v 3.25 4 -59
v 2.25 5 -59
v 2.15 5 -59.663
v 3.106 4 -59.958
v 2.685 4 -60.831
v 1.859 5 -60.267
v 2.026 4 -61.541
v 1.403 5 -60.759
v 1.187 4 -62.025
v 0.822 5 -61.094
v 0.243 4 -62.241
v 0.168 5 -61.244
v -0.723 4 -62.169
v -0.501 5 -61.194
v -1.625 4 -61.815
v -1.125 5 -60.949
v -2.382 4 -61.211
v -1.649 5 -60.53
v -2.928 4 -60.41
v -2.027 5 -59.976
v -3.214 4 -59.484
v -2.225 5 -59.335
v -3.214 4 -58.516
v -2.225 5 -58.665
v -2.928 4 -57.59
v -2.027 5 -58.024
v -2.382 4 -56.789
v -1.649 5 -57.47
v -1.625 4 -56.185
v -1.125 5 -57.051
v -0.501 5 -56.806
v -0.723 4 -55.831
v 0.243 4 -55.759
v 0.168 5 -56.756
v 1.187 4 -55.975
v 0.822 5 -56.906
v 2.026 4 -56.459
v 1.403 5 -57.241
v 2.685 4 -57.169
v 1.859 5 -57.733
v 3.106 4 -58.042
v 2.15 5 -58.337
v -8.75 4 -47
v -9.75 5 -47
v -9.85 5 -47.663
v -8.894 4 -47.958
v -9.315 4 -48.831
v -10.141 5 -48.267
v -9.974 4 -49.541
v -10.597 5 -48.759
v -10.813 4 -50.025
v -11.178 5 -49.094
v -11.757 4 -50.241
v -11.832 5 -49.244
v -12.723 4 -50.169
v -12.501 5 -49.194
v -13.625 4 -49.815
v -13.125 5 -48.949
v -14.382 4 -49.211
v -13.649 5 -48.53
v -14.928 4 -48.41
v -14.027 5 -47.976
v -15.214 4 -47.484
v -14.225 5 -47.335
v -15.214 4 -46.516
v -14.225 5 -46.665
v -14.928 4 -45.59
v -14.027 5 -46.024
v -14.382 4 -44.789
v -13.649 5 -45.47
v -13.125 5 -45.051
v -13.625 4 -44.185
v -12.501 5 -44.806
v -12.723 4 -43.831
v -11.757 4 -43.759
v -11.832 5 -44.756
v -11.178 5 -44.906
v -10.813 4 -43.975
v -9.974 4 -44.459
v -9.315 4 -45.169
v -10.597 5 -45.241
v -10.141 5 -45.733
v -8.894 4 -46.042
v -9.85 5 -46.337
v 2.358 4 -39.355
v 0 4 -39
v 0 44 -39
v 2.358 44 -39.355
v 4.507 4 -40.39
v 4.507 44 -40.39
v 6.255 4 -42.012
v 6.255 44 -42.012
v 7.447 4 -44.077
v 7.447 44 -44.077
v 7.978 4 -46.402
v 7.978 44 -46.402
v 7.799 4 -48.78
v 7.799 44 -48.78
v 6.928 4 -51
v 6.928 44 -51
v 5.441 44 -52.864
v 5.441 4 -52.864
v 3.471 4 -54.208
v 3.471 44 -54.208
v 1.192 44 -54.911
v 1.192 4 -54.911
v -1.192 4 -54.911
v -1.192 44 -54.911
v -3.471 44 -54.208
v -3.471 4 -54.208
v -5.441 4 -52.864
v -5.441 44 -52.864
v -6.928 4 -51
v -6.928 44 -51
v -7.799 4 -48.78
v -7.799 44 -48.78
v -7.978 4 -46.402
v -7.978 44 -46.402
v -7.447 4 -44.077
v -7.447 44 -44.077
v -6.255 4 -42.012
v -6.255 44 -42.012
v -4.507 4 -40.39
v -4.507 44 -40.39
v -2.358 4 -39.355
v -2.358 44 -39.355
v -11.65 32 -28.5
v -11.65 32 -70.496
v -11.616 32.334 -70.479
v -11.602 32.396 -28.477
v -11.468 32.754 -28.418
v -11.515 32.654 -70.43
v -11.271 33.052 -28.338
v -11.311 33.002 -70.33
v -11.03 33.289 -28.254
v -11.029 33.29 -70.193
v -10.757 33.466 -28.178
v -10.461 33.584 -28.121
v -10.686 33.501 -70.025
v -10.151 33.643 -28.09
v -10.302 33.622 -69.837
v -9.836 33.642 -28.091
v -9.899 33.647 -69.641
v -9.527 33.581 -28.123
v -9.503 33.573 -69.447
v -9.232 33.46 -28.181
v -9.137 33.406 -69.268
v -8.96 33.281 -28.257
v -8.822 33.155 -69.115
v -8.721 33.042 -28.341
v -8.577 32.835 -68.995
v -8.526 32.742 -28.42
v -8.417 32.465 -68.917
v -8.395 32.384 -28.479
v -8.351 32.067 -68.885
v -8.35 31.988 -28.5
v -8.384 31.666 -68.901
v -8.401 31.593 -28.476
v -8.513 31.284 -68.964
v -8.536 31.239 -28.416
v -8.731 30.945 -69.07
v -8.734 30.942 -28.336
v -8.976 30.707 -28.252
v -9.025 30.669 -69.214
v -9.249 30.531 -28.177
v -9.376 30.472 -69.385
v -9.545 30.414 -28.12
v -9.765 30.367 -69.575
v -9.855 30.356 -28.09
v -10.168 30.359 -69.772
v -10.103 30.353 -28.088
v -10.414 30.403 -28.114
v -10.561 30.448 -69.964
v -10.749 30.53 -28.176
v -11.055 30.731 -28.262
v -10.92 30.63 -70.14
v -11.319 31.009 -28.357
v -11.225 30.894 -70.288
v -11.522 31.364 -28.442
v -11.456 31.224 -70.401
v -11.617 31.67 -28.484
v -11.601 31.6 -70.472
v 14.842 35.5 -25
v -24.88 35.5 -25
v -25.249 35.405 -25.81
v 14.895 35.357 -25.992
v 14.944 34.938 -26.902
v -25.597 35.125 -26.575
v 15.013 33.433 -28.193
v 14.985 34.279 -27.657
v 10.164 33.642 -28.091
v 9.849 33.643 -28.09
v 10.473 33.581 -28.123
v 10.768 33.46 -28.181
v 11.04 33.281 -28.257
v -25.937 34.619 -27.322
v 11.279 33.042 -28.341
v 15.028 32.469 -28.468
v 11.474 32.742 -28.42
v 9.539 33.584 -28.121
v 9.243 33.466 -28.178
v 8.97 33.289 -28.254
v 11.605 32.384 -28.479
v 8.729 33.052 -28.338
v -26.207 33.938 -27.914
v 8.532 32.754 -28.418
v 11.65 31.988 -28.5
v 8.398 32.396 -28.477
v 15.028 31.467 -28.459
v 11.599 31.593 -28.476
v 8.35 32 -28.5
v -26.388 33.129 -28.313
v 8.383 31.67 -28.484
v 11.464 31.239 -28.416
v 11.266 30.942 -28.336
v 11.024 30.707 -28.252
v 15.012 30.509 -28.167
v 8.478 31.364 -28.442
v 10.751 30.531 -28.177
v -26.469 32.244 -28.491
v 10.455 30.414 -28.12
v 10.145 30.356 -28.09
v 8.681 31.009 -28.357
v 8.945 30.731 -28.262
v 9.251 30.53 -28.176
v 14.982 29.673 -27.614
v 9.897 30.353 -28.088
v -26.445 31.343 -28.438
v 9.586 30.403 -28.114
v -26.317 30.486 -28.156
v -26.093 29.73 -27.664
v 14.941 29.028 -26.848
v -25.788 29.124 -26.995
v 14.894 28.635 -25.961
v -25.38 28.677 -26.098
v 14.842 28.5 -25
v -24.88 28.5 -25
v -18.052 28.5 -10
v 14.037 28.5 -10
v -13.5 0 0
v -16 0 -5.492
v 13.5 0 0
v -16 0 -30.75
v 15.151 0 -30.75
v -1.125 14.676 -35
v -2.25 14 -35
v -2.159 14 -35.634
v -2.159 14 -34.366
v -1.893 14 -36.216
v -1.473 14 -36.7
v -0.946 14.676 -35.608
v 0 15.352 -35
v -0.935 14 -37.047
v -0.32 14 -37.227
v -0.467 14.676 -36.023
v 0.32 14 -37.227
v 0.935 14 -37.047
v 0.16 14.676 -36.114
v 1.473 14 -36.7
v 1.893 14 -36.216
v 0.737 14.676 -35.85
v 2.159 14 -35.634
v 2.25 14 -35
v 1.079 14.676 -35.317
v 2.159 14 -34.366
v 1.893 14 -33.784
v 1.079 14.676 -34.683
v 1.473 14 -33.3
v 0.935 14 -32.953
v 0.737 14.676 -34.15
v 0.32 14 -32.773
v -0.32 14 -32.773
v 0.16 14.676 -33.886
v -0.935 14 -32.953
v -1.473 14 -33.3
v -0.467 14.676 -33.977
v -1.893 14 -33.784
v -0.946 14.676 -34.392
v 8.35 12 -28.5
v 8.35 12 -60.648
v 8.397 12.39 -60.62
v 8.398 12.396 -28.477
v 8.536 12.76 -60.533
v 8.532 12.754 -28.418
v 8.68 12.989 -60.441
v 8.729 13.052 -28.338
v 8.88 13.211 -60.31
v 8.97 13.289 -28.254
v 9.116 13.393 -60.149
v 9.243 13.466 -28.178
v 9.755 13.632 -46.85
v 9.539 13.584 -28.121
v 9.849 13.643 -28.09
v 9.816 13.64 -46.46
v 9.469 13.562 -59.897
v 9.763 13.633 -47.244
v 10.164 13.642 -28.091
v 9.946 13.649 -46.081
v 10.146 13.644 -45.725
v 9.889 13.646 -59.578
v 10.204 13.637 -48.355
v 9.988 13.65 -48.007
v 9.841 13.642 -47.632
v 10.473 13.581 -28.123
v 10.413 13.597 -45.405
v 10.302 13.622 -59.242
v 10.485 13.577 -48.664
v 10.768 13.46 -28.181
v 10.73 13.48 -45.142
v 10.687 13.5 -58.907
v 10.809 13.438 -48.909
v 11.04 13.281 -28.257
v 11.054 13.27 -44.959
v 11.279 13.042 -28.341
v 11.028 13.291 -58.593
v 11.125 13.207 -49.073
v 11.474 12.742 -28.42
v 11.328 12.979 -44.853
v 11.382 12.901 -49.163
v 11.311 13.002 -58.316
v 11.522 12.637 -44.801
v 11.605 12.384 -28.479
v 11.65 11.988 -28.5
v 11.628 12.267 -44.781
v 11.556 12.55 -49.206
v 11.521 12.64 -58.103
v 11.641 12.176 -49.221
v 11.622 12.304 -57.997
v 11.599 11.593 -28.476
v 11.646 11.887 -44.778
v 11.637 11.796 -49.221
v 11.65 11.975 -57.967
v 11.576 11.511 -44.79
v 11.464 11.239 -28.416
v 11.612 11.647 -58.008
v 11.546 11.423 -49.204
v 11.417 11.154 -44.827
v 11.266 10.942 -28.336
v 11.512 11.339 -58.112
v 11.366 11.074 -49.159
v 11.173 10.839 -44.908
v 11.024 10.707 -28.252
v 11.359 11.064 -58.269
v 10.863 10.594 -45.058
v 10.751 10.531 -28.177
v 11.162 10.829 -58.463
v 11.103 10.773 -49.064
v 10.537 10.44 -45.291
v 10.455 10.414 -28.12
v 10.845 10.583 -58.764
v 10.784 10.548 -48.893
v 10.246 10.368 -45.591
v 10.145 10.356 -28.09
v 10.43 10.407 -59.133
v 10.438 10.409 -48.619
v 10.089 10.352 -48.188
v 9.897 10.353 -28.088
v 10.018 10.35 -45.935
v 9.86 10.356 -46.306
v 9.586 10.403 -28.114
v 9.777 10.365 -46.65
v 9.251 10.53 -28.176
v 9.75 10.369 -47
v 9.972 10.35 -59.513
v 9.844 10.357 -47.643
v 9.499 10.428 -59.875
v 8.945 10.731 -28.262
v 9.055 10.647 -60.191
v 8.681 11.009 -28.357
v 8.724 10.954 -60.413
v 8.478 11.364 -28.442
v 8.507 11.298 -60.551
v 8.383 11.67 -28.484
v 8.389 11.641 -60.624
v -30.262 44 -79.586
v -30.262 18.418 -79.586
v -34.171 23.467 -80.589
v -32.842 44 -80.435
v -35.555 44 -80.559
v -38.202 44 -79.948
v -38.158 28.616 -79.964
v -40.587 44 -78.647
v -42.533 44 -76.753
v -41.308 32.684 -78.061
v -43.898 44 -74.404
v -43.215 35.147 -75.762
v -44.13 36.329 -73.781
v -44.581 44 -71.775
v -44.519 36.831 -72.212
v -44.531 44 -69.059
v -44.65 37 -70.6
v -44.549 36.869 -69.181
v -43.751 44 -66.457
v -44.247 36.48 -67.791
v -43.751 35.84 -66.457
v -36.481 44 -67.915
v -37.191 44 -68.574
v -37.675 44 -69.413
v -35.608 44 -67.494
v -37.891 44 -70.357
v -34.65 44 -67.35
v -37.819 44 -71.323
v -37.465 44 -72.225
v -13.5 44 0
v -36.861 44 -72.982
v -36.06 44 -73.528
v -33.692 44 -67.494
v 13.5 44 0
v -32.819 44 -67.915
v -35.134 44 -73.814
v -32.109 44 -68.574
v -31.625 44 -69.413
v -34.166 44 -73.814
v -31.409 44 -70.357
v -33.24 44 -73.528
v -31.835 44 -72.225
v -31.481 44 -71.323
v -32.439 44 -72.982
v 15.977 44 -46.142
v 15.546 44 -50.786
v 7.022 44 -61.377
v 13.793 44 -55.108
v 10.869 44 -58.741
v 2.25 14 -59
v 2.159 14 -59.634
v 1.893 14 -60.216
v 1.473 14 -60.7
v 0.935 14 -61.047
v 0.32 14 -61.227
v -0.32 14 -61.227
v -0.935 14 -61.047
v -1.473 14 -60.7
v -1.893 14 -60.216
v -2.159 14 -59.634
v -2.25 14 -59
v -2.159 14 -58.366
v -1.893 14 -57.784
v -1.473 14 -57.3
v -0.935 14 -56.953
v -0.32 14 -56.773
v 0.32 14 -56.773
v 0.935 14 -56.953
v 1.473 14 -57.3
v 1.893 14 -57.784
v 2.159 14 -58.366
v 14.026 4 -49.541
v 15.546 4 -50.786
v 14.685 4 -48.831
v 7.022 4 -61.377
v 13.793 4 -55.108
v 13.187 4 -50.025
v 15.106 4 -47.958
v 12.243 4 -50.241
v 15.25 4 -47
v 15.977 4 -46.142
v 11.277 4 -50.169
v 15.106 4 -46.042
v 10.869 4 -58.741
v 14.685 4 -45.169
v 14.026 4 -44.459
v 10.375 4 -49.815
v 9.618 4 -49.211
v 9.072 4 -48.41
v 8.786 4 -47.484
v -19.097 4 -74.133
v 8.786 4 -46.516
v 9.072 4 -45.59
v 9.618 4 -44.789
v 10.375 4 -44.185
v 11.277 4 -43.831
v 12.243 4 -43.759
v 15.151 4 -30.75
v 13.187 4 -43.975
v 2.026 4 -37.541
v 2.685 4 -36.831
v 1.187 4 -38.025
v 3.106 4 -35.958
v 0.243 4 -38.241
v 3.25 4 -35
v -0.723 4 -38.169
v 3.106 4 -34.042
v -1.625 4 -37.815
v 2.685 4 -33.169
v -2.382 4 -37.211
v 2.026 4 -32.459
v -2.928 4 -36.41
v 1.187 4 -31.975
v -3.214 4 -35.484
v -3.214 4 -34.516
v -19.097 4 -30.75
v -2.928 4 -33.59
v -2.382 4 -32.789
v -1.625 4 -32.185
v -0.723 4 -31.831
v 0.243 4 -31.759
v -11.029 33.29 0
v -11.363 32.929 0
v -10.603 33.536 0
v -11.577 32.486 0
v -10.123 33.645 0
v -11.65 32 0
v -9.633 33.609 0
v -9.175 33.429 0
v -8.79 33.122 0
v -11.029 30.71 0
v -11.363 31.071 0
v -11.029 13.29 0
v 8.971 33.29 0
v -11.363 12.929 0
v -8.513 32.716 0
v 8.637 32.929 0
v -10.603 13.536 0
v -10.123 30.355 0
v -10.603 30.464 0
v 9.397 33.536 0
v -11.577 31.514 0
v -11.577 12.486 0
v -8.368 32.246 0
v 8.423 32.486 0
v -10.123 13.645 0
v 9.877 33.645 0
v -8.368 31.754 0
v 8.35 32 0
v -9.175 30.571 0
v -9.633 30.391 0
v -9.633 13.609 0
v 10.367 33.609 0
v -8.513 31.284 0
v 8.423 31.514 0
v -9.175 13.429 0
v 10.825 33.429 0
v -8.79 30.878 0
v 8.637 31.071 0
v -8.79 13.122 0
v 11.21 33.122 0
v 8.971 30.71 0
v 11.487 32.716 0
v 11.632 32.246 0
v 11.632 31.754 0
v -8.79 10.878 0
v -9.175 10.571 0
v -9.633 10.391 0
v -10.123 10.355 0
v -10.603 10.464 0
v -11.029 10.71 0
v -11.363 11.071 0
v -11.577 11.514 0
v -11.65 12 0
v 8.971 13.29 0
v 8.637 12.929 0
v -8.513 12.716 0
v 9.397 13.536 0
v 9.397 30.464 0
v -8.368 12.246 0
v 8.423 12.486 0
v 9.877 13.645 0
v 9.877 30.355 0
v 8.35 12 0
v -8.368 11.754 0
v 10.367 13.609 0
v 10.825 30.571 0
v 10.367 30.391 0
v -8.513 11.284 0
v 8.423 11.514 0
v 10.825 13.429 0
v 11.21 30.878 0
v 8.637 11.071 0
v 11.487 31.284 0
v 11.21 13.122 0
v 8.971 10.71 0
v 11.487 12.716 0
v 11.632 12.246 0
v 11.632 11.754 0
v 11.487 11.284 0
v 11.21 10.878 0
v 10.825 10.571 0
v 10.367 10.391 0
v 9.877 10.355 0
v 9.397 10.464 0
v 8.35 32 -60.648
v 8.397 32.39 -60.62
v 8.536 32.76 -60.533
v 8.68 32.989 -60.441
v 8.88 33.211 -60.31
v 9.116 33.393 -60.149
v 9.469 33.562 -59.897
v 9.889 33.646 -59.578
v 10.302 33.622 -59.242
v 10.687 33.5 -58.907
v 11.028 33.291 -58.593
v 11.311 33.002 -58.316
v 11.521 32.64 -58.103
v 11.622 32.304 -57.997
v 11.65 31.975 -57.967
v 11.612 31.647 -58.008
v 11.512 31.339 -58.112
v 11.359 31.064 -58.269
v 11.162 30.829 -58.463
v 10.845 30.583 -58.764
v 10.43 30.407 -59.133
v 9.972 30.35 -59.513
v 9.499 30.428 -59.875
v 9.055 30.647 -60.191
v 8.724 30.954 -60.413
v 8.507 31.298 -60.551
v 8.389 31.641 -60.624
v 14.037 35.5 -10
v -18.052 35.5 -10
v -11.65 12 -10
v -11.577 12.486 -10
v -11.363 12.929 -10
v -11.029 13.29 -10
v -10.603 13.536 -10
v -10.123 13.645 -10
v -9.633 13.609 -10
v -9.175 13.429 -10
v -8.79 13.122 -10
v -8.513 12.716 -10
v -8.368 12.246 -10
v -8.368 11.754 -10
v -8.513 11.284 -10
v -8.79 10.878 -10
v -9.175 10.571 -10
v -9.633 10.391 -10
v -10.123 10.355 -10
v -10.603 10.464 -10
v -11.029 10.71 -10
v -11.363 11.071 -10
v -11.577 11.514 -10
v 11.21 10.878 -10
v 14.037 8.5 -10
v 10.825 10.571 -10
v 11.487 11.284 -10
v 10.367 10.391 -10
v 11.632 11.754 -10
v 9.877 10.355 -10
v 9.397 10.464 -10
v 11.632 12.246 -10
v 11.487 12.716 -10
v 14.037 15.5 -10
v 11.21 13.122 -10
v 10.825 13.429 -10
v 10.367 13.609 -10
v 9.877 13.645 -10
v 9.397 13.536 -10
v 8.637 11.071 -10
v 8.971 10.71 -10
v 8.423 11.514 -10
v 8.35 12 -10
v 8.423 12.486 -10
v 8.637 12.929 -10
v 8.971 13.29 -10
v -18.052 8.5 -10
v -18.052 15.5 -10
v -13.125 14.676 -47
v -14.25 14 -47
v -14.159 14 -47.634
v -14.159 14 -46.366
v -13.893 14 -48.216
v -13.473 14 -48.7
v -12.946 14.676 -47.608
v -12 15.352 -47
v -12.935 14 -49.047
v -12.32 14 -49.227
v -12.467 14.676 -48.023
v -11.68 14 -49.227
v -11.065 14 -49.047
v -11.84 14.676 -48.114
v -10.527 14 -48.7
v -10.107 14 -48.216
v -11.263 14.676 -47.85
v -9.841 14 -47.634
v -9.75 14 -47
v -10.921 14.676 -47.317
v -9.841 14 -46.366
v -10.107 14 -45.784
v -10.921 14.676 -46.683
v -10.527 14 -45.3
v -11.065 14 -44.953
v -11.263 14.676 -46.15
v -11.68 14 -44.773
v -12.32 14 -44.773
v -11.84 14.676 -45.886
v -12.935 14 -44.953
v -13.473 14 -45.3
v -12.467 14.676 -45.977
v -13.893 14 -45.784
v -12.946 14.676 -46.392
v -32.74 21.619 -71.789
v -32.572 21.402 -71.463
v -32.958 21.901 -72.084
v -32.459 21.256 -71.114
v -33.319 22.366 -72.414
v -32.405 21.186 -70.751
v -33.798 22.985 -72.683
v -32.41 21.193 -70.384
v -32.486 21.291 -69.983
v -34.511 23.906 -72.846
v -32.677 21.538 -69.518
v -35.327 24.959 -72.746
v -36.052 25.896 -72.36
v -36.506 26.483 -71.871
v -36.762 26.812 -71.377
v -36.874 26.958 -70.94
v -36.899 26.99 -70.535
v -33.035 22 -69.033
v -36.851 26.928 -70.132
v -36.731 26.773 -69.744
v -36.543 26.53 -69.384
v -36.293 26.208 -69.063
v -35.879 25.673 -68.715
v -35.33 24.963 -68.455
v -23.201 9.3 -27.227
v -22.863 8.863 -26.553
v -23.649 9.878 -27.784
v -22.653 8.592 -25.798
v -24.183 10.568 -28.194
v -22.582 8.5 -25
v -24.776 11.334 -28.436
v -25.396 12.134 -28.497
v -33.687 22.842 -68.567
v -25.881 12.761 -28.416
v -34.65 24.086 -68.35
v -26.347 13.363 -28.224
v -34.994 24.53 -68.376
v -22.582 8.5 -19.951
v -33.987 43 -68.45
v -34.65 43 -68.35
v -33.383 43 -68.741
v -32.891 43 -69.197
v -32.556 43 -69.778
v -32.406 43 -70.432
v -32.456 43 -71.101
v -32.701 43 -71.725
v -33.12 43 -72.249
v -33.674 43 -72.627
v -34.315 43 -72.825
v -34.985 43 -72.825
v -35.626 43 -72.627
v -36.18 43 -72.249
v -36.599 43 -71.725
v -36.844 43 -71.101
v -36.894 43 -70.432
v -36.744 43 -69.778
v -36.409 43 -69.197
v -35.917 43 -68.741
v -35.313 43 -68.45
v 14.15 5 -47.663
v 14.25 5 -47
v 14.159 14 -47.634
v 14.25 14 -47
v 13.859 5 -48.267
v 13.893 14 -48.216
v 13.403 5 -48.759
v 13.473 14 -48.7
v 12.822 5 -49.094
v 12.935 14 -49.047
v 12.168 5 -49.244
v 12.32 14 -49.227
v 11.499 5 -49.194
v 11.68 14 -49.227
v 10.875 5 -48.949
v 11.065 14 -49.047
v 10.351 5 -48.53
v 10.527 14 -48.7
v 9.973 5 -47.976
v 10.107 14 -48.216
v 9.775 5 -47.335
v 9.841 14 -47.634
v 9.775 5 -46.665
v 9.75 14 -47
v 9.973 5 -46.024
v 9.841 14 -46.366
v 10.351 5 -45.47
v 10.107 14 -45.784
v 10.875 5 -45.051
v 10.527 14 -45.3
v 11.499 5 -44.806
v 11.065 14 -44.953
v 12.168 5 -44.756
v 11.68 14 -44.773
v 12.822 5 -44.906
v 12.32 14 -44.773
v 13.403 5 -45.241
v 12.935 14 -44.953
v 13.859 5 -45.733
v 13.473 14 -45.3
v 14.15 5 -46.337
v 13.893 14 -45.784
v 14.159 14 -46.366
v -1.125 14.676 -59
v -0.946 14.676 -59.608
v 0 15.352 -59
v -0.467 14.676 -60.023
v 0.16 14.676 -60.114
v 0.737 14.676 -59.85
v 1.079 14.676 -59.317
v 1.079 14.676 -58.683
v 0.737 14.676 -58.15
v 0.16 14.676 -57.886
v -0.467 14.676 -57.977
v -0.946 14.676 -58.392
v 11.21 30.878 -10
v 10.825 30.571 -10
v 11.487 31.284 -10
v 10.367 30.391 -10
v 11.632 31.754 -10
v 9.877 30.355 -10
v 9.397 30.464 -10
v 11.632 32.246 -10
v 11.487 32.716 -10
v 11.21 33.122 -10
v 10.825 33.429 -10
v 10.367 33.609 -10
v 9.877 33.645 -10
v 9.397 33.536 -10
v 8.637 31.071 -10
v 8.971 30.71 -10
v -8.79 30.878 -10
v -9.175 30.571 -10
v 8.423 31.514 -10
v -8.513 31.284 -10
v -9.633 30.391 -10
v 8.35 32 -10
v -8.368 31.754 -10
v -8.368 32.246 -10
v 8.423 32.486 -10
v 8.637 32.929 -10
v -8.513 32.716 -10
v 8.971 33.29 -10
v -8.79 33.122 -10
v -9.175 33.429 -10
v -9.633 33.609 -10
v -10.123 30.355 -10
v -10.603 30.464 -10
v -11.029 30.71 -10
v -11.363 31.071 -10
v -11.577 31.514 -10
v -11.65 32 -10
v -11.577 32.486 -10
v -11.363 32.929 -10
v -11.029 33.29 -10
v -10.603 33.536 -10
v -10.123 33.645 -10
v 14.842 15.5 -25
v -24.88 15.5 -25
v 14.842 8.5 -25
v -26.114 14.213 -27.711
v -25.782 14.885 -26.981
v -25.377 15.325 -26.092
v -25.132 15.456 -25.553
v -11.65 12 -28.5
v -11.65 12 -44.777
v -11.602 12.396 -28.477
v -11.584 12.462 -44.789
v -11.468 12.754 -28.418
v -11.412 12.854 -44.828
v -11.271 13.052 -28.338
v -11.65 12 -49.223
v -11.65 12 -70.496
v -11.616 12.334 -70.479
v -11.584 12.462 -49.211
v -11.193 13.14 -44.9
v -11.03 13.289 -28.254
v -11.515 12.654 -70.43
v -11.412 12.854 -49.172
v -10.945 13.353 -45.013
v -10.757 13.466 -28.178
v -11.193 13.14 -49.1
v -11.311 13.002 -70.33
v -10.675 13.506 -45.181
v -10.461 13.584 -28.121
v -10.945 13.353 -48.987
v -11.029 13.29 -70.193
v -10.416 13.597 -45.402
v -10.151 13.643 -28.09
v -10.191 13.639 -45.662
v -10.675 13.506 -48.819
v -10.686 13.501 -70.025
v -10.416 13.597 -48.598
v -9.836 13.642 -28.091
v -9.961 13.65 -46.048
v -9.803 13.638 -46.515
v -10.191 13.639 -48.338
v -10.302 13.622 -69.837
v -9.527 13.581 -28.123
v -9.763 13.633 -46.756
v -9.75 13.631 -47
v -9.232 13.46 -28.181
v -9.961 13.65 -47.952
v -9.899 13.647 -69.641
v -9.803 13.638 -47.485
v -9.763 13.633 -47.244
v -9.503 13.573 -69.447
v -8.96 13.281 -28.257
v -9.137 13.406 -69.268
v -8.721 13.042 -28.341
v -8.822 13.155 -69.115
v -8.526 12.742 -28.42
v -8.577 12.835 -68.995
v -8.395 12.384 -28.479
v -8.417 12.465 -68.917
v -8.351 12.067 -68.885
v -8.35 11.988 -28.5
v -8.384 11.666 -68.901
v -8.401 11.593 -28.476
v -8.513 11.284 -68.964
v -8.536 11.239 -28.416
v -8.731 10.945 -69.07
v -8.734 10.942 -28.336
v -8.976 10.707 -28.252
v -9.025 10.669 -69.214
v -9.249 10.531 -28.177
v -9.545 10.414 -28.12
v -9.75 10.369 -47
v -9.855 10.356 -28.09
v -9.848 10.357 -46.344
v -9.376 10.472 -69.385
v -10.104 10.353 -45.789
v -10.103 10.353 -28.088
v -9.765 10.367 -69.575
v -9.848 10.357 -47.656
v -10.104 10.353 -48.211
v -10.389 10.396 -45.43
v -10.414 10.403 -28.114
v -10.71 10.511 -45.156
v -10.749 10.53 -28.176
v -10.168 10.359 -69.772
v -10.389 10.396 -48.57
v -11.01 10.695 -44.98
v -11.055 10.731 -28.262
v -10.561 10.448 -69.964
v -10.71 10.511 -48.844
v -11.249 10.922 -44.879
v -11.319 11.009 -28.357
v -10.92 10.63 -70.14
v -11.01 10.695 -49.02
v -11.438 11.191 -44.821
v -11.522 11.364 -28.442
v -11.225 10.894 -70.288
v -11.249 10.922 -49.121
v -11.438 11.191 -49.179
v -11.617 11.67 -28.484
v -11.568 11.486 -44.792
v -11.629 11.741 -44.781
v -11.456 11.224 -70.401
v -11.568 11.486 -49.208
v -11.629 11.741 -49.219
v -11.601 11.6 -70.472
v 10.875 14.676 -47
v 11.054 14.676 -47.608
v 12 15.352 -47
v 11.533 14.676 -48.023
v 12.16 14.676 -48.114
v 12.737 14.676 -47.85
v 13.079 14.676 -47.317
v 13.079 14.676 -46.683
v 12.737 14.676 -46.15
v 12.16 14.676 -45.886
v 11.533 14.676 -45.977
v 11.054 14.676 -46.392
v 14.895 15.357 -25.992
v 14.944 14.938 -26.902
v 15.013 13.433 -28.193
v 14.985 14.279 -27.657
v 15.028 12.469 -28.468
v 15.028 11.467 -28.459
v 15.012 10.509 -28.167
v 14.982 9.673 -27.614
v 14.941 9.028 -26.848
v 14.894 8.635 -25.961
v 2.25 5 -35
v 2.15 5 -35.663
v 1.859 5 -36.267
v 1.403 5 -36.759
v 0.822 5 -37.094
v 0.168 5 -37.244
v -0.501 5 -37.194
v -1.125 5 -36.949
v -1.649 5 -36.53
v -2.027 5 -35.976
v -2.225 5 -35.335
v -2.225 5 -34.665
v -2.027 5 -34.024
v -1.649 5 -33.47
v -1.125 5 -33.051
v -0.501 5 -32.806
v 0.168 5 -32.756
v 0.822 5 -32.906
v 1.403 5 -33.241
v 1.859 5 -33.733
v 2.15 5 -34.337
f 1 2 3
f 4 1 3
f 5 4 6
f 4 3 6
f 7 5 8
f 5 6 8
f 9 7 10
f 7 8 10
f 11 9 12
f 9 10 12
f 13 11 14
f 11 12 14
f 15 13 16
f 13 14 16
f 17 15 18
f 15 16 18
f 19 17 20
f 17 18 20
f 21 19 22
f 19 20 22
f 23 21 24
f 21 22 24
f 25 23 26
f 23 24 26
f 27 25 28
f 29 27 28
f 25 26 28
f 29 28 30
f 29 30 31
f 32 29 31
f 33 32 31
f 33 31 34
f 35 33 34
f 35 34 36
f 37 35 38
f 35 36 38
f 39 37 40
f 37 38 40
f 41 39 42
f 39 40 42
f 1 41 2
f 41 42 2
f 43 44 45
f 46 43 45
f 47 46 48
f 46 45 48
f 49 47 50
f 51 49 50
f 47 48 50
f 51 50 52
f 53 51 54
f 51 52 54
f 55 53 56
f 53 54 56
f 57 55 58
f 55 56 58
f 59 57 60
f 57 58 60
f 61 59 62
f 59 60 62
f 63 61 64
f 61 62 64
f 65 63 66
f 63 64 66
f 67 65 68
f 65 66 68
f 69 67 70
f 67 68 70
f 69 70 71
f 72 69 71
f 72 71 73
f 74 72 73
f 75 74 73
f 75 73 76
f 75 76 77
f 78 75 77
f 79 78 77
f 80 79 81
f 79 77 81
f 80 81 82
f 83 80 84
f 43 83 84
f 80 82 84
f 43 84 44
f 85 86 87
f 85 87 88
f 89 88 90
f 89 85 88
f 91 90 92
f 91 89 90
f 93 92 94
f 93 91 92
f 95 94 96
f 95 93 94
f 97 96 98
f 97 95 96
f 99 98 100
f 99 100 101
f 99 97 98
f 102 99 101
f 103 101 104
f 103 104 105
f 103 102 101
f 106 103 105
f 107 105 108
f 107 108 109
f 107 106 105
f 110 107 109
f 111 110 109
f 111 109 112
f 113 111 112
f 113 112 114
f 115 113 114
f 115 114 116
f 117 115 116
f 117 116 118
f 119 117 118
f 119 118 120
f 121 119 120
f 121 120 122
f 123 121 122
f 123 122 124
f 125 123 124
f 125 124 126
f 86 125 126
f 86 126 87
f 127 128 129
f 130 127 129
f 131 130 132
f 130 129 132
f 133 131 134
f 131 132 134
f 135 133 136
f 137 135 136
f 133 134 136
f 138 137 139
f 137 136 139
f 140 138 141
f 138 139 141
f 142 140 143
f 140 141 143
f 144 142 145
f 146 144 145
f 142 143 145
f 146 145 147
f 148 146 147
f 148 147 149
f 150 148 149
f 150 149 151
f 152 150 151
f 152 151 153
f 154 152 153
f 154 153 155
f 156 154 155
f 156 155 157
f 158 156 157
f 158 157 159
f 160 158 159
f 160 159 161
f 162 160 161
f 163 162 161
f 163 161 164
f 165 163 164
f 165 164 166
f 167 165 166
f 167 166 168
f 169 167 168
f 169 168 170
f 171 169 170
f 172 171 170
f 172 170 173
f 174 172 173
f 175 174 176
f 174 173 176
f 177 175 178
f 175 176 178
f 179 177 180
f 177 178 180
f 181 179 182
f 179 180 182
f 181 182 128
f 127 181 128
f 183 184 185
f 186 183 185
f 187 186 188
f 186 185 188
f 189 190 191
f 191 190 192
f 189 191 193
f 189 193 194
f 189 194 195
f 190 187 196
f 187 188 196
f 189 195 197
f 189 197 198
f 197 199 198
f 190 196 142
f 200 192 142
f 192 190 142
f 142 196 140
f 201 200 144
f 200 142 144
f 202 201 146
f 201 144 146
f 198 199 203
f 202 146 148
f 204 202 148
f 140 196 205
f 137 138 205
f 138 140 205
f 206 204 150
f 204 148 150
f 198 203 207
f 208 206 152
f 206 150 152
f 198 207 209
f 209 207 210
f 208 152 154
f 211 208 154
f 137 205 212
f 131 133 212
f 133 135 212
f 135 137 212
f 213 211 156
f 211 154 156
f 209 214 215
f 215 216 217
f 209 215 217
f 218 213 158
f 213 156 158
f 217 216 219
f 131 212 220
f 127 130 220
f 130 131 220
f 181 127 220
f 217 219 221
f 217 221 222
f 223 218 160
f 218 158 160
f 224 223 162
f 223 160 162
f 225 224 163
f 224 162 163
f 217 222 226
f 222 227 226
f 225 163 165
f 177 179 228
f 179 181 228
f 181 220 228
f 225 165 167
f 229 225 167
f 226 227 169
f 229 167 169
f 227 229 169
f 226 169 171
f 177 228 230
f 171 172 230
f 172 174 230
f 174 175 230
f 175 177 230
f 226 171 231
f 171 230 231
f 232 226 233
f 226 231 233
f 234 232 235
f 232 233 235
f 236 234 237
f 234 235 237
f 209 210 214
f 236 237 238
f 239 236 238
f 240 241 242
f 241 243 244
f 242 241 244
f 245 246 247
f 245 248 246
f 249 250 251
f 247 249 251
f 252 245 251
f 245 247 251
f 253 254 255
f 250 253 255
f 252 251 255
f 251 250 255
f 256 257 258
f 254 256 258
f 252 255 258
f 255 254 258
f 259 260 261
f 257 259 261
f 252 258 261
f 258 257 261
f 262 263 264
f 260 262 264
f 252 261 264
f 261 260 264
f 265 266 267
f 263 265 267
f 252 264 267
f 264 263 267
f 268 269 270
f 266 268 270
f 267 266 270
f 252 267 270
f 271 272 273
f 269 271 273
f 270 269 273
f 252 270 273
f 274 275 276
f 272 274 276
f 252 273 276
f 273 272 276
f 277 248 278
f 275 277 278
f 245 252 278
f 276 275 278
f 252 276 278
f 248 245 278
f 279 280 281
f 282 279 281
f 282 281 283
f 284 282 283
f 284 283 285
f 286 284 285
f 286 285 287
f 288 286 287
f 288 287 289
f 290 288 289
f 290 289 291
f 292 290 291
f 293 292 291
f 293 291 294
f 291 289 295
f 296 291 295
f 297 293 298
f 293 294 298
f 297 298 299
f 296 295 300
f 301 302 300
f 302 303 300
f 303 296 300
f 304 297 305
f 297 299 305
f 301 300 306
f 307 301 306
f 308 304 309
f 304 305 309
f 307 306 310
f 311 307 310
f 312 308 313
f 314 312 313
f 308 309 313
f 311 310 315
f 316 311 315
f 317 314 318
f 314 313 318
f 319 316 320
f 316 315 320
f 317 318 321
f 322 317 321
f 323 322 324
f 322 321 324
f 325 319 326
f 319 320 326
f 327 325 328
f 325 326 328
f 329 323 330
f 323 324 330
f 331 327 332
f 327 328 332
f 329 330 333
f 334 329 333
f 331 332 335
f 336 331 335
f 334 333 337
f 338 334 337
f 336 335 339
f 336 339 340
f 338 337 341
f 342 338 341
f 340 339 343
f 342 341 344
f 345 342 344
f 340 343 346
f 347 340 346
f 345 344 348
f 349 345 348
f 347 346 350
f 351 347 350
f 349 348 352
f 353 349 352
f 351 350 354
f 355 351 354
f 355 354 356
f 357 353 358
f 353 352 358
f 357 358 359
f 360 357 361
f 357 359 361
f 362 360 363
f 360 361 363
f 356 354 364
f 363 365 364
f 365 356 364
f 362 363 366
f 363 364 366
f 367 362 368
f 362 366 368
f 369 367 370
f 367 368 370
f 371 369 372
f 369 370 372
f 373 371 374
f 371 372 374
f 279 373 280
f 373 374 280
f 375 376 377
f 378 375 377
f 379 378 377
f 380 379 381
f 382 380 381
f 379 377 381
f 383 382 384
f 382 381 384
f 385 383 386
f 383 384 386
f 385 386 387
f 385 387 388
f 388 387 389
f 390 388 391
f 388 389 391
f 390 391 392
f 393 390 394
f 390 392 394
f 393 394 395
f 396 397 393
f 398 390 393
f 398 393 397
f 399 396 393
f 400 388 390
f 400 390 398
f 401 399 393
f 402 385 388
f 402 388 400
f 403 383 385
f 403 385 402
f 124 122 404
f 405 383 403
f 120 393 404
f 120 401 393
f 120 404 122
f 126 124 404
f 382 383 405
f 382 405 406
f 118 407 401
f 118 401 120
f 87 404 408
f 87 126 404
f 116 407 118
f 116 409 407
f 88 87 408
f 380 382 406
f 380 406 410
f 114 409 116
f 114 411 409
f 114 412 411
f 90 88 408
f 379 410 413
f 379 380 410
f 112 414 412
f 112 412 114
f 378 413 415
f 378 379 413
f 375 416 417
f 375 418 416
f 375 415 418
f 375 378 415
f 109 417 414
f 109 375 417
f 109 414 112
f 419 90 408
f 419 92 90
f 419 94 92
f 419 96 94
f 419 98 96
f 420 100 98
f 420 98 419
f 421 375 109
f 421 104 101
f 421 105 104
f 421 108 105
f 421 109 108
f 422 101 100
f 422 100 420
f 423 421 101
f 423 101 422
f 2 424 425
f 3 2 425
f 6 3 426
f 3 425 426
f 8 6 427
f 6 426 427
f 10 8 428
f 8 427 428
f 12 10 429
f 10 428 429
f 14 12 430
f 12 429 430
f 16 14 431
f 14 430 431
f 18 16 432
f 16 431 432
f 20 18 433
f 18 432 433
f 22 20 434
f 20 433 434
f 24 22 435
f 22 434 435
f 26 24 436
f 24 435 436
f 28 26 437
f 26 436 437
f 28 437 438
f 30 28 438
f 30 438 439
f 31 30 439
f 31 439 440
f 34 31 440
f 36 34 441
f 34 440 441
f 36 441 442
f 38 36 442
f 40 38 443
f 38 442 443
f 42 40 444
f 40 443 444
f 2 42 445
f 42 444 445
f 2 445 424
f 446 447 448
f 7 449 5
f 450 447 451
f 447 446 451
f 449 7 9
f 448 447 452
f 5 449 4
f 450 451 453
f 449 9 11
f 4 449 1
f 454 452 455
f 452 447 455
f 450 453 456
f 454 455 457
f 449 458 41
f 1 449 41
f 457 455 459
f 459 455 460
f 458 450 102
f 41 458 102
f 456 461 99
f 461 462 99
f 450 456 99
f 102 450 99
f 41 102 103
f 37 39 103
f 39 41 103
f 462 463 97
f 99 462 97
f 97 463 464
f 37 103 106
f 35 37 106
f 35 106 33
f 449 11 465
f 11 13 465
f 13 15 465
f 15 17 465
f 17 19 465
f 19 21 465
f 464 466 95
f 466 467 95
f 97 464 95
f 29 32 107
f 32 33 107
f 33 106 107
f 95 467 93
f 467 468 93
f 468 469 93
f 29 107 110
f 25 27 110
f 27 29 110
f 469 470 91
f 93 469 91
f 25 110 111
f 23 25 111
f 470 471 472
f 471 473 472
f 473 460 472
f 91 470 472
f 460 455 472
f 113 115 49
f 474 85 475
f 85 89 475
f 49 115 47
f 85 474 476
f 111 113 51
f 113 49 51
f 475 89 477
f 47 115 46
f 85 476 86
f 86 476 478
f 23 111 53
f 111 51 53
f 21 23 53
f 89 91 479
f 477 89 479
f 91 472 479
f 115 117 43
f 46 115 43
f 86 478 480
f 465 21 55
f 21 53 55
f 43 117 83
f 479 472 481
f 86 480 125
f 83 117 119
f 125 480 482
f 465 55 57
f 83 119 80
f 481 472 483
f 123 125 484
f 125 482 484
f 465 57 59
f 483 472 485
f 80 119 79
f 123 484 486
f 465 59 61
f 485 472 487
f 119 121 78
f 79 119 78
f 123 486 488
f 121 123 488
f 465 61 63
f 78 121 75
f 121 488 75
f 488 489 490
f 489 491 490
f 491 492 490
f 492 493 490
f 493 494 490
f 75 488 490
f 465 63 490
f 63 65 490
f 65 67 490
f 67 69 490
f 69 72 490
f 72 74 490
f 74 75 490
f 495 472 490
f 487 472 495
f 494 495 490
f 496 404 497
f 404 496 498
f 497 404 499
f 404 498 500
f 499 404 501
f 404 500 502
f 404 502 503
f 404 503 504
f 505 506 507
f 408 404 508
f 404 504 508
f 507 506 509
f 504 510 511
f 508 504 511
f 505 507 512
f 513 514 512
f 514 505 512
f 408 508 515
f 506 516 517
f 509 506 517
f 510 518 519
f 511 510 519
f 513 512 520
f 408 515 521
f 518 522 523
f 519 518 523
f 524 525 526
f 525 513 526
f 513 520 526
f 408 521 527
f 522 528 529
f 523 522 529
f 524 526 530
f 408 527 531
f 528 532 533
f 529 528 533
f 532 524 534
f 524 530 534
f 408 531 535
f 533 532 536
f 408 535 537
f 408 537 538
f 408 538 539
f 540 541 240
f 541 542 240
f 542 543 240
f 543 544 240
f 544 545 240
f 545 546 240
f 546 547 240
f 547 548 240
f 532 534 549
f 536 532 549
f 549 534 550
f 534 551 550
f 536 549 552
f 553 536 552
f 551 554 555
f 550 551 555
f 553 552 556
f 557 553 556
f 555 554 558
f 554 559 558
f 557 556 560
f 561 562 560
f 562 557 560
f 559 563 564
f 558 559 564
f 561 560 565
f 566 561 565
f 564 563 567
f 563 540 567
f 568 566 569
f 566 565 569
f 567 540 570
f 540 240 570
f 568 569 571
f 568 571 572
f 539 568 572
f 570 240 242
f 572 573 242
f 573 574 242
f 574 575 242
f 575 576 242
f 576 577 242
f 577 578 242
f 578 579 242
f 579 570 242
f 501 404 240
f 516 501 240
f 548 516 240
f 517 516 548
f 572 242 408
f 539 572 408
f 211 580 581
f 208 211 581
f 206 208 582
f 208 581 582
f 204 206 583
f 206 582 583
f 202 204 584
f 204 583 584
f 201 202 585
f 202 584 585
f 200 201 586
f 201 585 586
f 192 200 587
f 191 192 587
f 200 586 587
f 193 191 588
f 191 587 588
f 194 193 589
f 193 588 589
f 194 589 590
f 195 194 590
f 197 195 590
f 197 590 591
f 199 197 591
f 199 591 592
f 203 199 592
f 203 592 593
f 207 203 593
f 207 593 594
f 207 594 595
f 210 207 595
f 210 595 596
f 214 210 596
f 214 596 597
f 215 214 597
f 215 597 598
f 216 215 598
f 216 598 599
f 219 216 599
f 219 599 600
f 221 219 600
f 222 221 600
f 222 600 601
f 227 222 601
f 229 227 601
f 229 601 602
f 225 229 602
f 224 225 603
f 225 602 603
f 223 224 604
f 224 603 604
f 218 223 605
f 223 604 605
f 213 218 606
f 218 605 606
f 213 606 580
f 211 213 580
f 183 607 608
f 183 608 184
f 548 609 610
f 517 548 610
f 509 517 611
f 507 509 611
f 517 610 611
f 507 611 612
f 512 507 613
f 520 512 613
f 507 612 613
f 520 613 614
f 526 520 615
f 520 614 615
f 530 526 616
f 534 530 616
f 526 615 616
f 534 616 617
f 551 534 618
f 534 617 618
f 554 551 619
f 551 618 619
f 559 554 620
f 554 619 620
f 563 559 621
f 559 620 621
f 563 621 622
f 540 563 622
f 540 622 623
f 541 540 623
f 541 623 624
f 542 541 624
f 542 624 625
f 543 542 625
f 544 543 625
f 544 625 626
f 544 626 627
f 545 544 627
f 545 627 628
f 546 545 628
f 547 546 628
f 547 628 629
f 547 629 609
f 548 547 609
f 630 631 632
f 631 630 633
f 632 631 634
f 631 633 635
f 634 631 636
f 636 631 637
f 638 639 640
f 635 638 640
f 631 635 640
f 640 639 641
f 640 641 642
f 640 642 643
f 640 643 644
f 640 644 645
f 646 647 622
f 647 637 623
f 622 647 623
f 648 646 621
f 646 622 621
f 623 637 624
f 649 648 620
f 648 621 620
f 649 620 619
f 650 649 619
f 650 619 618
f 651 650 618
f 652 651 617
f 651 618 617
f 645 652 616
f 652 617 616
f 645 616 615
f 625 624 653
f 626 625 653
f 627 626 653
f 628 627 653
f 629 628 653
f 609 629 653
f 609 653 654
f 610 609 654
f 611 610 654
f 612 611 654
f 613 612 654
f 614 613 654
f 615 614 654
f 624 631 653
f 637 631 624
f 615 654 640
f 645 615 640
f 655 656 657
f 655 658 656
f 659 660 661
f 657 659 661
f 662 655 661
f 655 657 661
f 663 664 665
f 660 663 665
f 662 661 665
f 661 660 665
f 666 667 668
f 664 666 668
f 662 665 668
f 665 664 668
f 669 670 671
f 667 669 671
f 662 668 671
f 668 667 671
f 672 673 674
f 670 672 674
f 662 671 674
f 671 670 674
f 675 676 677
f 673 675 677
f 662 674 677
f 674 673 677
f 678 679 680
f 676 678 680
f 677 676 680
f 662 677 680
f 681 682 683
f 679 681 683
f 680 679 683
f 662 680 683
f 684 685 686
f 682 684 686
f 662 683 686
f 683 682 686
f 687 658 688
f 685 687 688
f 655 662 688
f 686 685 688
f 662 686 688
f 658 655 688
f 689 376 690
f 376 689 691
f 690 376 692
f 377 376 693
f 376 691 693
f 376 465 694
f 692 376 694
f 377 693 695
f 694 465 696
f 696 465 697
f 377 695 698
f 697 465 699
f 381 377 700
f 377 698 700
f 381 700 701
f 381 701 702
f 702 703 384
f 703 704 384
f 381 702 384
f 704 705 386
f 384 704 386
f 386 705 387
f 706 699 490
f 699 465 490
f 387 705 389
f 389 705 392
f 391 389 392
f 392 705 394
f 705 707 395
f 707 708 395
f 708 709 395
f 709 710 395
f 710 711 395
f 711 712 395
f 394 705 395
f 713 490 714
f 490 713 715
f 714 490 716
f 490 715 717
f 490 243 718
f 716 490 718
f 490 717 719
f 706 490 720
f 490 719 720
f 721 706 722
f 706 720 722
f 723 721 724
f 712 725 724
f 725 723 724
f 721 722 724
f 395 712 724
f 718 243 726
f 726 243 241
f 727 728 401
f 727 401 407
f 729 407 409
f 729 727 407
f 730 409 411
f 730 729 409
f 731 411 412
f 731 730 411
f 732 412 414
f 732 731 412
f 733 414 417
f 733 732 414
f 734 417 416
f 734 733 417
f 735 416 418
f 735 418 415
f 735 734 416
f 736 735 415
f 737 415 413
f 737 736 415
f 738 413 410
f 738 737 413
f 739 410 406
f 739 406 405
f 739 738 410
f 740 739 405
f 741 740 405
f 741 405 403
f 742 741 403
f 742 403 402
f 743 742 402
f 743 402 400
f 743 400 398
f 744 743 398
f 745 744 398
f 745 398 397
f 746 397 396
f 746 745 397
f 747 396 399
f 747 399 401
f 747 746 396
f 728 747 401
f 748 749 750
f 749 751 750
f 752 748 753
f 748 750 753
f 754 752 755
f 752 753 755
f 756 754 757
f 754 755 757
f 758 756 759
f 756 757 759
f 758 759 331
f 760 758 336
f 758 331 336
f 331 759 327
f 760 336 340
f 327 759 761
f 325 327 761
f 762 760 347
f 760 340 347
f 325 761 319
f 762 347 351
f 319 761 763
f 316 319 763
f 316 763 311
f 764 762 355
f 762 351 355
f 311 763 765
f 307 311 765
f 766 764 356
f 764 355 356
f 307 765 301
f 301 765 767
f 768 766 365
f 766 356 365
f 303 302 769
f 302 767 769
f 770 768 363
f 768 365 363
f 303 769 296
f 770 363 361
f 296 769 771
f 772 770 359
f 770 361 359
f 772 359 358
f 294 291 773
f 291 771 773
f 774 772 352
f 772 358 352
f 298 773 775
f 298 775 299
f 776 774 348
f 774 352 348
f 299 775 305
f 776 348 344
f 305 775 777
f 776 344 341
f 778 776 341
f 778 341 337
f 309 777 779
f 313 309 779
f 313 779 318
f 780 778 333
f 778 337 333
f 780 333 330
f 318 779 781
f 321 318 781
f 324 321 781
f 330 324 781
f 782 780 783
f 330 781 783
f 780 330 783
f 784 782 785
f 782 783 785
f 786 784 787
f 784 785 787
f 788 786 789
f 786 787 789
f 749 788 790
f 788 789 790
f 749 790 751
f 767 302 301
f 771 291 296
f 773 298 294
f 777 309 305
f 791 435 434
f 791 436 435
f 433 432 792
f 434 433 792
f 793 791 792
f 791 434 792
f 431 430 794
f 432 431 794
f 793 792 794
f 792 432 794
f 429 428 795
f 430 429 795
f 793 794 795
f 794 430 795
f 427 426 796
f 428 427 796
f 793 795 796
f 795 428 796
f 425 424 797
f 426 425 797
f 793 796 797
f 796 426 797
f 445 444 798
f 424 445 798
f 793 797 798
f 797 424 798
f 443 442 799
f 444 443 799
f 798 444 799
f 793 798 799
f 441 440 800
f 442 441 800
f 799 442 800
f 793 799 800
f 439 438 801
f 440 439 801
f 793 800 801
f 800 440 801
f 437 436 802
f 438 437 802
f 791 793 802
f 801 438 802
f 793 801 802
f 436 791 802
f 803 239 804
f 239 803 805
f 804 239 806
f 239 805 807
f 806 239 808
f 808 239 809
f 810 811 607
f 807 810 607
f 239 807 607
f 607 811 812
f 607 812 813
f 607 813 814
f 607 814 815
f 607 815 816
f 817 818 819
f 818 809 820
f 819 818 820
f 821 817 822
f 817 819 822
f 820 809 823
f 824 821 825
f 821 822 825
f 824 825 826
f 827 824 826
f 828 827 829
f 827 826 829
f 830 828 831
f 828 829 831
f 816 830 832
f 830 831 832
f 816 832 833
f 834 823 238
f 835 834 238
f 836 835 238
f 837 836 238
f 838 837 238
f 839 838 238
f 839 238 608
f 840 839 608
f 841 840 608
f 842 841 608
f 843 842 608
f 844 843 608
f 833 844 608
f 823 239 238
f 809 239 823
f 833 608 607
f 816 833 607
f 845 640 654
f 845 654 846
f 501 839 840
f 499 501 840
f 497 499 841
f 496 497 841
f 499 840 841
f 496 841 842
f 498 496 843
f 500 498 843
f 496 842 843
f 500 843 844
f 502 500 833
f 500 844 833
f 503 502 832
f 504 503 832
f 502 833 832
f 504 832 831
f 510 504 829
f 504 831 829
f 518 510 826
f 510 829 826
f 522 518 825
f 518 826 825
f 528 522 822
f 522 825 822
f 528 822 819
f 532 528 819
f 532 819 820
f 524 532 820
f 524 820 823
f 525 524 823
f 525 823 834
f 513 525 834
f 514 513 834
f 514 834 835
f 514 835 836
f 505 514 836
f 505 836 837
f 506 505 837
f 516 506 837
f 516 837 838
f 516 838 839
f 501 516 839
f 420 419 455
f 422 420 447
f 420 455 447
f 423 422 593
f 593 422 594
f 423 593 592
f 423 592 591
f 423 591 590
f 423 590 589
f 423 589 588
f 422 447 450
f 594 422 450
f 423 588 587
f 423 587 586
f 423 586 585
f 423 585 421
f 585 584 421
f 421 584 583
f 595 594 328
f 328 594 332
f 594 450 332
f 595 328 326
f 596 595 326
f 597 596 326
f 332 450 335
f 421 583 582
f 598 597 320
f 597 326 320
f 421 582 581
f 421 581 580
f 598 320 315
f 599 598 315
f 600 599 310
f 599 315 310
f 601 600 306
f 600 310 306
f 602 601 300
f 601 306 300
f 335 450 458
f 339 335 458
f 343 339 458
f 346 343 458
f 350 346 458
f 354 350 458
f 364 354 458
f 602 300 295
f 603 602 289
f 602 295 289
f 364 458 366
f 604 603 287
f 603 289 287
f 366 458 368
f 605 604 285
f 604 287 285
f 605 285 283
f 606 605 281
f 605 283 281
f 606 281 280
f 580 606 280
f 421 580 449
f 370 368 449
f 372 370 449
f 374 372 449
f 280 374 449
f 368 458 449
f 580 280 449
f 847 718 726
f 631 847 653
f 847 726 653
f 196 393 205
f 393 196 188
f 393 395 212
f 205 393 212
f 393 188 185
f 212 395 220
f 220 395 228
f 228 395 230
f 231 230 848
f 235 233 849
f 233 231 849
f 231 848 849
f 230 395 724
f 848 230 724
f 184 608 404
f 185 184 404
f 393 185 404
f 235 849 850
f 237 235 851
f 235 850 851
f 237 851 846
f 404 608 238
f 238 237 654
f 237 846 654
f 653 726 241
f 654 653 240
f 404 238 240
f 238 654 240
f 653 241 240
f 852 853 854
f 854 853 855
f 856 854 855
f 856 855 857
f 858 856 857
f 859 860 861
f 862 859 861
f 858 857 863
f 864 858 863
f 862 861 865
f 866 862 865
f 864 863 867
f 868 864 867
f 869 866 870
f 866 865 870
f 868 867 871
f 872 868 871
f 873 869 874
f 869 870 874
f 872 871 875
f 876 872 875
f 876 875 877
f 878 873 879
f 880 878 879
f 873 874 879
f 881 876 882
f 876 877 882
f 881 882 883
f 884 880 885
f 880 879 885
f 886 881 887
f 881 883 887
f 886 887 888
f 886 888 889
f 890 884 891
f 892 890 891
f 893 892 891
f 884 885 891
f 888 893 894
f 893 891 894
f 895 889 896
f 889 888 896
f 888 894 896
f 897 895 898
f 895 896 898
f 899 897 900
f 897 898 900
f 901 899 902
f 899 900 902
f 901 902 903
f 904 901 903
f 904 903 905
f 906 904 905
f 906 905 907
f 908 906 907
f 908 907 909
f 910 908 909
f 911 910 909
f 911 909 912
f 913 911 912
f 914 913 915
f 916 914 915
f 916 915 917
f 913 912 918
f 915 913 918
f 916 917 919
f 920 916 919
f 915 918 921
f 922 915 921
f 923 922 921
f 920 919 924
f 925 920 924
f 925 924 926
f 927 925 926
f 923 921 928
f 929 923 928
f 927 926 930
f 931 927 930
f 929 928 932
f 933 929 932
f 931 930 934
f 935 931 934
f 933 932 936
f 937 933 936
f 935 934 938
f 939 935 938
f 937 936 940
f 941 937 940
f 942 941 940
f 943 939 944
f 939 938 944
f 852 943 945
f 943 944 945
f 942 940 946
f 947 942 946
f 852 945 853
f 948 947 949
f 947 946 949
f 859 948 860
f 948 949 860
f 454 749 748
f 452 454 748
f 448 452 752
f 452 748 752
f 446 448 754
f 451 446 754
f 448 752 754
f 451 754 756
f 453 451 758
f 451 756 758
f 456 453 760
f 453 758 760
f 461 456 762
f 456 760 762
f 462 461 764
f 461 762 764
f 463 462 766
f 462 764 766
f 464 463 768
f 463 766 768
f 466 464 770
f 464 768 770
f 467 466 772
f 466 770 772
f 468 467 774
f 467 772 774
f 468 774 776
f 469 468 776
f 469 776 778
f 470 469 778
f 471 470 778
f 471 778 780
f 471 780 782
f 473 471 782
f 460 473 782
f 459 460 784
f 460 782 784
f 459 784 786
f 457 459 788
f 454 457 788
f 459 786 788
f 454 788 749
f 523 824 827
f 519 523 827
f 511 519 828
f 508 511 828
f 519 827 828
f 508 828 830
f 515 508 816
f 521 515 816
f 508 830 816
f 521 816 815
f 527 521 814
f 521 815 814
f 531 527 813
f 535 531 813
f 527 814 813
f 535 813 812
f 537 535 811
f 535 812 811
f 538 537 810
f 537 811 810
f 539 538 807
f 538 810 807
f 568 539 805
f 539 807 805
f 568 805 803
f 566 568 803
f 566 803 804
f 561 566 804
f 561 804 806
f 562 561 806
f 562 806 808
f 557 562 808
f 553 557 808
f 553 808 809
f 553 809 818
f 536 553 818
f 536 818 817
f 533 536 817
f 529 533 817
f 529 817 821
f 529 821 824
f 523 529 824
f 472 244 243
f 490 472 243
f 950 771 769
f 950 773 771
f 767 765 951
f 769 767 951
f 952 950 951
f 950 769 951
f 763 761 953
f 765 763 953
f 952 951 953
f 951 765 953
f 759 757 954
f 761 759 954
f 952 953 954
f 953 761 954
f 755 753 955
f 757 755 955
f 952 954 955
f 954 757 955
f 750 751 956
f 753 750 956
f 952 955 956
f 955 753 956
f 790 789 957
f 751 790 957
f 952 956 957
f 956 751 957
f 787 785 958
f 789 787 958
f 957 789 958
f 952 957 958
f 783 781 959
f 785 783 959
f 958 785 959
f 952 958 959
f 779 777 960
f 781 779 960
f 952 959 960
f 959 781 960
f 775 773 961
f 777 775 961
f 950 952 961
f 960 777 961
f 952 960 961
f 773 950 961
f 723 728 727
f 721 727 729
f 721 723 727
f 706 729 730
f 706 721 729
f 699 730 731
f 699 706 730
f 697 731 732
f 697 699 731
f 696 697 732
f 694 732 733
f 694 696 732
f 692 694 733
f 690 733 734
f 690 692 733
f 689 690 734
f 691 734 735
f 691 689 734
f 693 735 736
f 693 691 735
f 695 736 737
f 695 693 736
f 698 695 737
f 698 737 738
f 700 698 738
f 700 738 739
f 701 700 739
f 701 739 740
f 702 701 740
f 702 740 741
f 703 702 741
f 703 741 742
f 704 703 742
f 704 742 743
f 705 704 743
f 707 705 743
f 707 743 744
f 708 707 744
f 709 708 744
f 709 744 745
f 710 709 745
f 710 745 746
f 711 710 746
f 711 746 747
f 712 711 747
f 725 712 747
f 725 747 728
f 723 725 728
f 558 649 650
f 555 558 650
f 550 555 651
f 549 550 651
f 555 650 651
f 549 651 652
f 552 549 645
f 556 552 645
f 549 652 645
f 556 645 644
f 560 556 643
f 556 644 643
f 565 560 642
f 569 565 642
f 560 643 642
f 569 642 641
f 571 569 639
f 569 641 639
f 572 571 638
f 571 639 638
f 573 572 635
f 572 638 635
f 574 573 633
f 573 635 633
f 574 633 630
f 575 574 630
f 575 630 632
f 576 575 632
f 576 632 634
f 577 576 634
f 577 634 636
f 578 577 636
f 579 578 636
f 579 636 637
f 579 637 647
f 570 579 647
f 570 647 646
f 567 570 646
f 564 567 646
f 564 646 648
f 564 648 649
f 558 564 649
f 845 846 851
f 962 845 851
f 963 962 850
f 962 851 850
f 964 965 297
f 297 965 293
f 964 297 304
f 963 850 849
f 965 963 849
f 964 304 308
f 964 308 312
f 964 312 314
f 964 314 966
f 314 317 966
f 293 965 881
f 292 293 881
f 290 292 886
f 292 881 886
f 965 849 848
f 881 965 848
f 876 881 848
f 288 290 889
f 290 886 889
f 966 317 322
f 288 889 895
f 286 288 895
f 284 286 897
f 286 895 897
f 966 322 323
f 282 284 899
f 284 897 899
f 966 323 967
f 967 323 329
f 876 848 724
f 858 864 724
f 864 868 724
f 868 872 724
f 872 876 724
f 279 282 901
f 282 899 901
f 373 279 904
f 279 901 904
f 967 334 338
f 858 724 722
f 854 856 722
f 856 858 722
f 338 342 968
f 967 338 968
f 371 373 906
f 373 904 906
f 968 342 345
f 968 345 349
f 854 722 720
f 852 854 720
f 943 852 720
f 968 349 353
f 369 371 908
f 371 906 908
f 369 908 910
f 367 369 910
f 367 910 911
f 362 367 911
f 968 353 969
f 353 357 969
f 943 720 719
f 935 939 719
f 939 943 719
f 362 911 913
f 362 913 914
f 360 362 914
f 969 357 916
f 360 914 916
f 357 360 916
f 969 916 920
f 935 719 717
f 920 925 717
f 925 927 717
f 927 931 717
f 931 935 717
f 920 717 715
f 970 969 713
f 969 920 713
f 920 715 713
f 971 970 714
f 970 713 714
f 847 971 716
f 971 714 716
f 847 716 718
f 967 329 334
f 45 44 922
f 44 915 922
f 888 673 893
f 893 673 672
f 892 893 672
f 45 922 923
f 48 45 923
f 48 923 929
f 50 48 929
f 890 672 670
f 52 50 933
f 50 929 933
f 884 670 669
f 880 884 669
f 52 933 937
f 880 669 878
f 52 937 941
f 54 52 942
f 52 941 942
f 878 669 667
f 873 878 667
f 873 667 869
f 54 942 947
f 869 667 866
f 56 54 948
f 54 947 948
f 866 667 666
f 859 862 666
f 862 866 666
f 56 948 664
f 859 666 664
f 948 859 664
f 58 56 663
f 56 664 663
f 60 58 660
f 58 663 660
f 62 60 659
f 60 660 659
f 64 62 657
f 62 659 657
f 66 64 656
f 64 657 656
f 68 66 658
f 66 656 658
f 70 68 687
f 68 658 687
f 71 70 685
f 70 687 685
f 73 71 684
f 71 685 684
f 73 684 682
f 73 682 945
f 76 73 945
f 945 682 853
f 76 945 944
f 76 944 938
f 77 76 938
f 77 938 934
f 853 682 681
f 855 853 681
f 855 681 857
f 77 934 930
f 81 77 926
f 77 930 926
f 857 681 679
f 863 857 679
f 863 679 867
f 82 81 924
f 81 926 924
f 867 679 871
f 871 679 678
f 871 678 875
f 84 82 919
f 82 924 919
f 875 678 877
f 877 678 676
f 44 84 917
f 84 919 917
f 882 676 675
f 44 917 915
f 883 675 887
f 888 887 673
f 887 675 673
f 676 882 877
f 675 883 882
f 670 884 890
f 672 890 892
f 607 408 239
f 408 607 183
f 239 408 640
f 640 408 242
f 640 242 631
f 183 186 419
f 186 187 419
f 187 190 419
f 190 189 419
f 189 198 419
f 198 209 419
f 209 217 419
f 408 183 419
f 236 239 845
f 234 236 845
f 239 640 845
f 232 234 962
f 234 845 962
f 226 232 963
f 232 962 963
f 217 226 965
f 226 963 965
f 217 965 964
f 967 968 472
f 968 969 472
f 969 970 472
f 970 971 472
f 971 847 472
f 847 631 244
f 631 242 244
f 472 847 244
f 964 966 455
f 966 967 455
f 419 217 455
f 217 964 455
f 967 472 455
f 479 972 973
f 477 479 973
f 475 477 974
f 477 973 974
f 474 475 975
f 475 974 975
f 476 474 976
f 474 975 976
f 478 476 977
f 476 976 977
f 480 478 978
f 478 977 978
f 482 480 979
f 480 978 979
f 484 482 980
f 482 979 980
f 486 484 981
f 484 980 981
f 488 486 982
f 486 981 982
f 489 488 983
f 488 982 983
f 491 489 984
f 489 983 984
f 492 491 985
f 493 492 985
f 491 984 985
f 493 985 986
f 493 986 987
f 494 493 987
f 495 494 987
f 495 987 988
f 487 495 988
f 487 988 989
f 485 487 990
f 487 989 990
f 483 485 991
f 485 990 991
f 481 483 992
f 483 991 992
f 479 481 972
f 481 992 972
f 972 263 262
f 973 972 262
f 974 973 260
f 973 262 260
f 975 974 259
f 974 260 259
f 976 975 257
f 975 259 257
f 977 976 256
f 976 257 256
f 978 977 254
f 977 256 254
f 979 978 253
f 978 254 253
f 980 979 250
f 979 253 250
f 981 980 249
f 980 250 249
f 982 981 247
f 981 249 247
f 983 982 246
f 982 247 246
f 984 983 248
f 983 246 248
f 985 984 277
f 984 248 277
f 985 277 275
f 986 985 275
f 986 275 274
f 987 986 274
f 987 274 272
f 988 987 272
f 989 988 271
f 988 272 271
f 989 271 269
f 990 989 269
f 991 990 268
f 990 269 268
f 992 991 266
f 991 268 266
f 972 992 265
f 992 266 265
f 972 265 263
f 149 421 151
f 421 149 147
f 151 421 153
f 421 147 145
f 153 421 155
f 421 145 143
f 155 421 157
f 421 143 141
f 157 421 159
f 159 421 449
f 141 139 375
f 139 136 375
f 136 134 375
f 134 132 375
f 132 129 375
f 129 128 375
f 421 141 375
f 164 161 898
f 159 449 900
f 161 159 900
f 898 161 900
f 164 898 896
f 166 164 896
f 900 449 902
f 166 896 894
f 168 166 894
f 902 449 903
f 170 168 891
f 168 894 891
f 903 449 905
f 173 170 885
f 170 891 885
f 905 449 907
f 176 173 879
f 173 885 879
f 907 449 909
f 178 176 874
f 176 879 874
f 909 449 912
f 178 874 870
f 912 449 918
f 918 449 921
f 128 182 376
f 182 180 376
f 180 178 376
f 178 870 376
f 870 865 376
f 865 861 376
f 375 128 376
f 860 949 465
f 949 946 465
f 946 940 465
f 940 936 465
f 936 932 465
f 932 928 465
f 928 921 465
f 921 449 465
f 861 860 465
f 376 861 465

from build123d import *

# Parameters (mm, degrees)
SKETCH1_R                      = 8
SKETCH1_R_2                    = 2.25
BOSS_EXTRUDE1_DEPTH            = 44
CUT_EXTRUDE4_DEPTH             = 4
CUT_EXTRUDE5_DEPTH             = 103.107700493
F_4_5_4_5_DIAMETER_HOLE1_D     = 4.5
F_4_5_4_5_DIAMETER_HOLE1_DEPTH = 10
F_4_5_4_5_DIAMETER_HOLE1_TIP   = 1.351936393
CHAMFER1_SIZE                  = 1
F_3_3_3_3_DIAMETER_HOLE1_D     = 3.3
CUT_EXTRUDE6_DEPTH             = 103.107700536
CUT_EXTRUDE6_DEPTH_BACK        = 103.107700536


with BuildPart() as part:
    # Sketch1 → Boss-Extrude1 (new body)
    with BuildSketch(Plane(origin=(0, 0, 0), x_dir=(1, 0, 0), z_dir=(0, 1, 0))):
        with BuildLine():
            Line((-13.5, 0), (13.5, 0))
            Line((13.5, 0), (15.976995957, 46.142328626))
            ThreePointArc((15.976995957, 46.142328626), (13.793369664, 55.108202842), (7.021555451, 61.376987134))
            Line((7.021555451, 61.376987134), (-30.261527843, 79.585616959))
            ThreePointArc((-30.261527843, 79.585616959), (-41.624453455, 77.76637977), (-43.75141009, 66.457013833))
            Line((-43.75141009, 66.457013833), (-13.5, 0))
        make_face()
        with Locations(Location((0, 47, 0), (0, 0, 270))):
            Circle(SKETCH1_R, mode=Mode.SUBTRACT)
        with Locations(Location((-34.65, 70.6, 0), (0, 0, 270))):
            Circle(SKETCH1_R_2, mode=Mode.SUBTRACT)
    extrude(amount=BOSS_EXTRUDE1_DEPTH)

    # Sketch2 → Cut-Extrude4 (cut)
    with BuildSketch(Plane.XZ):
        Polygon((0, -30.75), (15.150710485, -30.75), (16.545133066, -56.725781169), (-44.65, -86.612781563), (-44.65, -30.75), align=None)
    extrude(amount=-CUT_EXTRUDE4_DEPTH, mode=Mode.SUBTRACT)

    # Sketch4 → Cut-Extrude5 (cut, through all)
    with BuildSketch(Plane.XY):
        Polygon((-16, 0), (-44.65, 37), (-44.65, 0), align=None)
    extrude(amount=-CUT_EXTRUDE5_DEPTH, mode=Mode.SUBTRACT)

    # Ø4.5 (4.5) Diameter Hole1
    with Locations(Plane(origin=(0, 4, 0), x_dir=(-1, 0, 0), z_dir=(0, -1, 0))):
        with Locations((0, 35), (0, 59), (12, 47), (-12, 47)):
            Hole(F_4_5_4_5_DIAMETER_HOLE1_D / 2, depth=F_4_5_4_5_DIAMETER_HOLE1_DEPTH)
            with Locations((0, 0, -(F_4_5_4_5_DIAMETER_HOLE1_DEPTH + F_4_5_4_5_DIAMETER_HOLE1_TIP / 2))):  # 118° drill point
                Cone(0, F_4_5_4_5_DIAMETER_HOLE1_D / 2, F_4_5_4_5_DIAMETER_HOLE1_TIP, mode=Mode.SUBTRACT)

    # Chamfer1
    chamfer1_edges = [part.edges().sort_by_distance(p)[0] for p in [
        (9.75, 4, -47),
        (-14.25, 4, -47),
        (-2.25, 4, -59),
        (-2.25, 4, -35),
        (-34.65, 44, -72.85),
    ]]
    chamfer(chamfer1_edges, length=CHAMFER1_SIZE)

    # Ø3.3 (3.3) Diameter Hole1 (through all)
    with Locations(Plane.XY):
        with Locations((-10, 32), (10, 32), (10, 12), (-10, 12)):
            Hole(F_3_3_3_3_DIAMETER_HOLE1_D / 2)

    # Sketch13 → Cut-Extrude6 (cut, two sides: drawn at the far end of the back side and taken through both)
    with BuildSketch(Plane(origin=(0, 0, 0), x_dir=(0, 0, -1), z_dir=(1, 0, 0)).offset(-CUT_EXTRUDE6_DEPTH_BACK)):
        with BuildLine():
            Line((10, 35.5), (25, 35.5))
            ThreePointArc((25, 35.5), (28.5, 32), (25, 28.5))
            Line((25, 28.5), (10, 28.5))
            Line((10, 28.5), (10, 35.5))
        make_face()
        with BuildLine():
            Line((10, 15.5), (25, 15.5))
            ThreePointArc((25, 15.5), (28.5, 12), (25, 8.5))
            Line((25, 8.5), (10, 8.5))
            Line((10, 8.5), (10, 15.5))
        make_face()
    extrude(amount=CUT_EXTRUDE6_DEPTH + CUT_EXTRUDE6_DEPTH_BACK, mode=Mode.SUBTRACT)


solid = part.part
